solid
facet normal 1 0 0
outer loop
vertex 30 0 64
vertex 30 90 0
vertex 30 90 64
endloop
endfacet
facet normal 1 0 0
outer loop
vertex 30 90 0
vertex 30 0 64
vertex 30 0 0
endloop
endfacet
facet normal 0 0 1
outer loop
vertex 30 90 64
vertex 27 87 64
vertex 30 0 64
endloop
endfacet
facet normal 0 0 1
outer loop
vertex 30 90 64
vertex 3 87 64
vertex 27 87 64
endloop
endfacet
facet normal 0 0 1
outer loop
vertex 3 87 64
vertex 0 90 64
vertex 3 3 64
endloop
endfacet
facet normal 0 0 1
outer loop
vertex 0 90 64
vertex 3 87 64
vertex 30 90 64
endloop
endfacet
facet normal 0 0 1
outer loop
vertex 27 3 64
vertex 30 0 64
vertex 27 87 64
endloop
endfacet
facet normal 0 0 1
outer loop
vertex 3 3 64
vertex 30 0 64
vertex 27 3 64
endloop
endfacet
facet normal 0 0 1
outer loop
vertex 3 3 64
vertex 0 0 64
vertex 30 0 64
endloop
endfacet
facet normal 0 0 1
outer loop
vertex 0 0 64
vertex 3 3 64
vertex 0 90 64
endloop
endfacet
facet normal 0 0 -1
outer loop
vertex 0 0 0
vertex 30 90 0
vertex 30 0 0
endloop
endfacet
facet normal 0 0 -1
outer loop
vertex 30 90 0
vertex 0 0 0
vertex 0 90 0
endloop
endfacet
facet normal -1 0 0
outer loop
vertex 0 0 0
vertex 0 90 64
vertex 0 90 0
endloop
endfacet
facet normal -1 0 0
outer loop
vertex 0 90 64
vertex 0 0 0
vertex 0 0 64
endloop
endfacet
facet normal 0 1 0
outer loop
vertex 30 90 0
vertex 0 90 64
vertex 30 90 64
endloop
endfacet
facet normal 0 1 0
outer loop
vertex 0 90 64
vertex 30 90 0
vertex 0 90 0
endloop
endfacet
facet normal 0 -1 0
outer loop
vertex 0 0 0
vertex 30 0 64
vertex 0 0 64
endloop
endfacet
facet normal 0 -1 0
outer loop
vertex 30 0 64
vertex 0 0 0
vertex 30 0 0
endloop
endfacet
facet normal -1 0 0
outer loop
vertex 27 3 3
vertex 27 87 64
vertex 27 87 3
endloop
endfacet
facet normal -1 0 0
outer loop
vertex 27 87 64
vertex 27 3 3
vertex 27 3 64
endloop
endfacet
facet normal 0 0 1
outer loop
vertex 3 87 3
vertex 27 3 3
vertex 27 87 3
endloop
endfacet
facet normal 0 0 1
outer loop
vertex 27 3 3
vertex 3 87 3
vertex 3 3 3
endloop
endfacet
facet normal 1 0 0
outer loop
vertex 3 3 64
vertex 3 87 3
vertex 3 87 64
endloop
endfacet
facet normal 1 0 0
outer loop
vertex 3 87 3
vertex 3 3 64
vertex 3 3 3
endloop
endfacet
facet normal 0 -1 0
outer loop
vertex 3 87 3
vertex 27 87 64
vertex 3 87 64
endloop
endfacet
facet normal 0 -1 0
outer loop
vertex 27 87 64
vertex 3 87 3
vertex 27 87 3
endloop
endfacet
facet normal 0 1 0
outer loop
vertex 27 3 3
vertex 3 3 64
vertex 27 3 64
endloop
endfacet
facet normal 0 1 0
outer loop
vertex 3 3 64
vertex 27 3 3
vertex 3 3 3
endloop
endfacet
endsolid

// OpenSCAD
// Enkel boks - mål oppgitt er innvendige
// Skrevet av Roy Sigurd Karlsbakk <roy@karlsbakk.net>

h = 58;                 // Høyde
l = 84;                 // Lengde
b = 24;                 // Bredde
t = 3;                  // Tykkelse
pp = $preview ? .1 : 0; // Fiks for å få preview til å se vettugt ut

difference() {
    cube([b+t*2, l+t*2, h+t*2]);
    translate([t,t,t]) {
        cube([b, l, h+t+pp]);
    }
}
